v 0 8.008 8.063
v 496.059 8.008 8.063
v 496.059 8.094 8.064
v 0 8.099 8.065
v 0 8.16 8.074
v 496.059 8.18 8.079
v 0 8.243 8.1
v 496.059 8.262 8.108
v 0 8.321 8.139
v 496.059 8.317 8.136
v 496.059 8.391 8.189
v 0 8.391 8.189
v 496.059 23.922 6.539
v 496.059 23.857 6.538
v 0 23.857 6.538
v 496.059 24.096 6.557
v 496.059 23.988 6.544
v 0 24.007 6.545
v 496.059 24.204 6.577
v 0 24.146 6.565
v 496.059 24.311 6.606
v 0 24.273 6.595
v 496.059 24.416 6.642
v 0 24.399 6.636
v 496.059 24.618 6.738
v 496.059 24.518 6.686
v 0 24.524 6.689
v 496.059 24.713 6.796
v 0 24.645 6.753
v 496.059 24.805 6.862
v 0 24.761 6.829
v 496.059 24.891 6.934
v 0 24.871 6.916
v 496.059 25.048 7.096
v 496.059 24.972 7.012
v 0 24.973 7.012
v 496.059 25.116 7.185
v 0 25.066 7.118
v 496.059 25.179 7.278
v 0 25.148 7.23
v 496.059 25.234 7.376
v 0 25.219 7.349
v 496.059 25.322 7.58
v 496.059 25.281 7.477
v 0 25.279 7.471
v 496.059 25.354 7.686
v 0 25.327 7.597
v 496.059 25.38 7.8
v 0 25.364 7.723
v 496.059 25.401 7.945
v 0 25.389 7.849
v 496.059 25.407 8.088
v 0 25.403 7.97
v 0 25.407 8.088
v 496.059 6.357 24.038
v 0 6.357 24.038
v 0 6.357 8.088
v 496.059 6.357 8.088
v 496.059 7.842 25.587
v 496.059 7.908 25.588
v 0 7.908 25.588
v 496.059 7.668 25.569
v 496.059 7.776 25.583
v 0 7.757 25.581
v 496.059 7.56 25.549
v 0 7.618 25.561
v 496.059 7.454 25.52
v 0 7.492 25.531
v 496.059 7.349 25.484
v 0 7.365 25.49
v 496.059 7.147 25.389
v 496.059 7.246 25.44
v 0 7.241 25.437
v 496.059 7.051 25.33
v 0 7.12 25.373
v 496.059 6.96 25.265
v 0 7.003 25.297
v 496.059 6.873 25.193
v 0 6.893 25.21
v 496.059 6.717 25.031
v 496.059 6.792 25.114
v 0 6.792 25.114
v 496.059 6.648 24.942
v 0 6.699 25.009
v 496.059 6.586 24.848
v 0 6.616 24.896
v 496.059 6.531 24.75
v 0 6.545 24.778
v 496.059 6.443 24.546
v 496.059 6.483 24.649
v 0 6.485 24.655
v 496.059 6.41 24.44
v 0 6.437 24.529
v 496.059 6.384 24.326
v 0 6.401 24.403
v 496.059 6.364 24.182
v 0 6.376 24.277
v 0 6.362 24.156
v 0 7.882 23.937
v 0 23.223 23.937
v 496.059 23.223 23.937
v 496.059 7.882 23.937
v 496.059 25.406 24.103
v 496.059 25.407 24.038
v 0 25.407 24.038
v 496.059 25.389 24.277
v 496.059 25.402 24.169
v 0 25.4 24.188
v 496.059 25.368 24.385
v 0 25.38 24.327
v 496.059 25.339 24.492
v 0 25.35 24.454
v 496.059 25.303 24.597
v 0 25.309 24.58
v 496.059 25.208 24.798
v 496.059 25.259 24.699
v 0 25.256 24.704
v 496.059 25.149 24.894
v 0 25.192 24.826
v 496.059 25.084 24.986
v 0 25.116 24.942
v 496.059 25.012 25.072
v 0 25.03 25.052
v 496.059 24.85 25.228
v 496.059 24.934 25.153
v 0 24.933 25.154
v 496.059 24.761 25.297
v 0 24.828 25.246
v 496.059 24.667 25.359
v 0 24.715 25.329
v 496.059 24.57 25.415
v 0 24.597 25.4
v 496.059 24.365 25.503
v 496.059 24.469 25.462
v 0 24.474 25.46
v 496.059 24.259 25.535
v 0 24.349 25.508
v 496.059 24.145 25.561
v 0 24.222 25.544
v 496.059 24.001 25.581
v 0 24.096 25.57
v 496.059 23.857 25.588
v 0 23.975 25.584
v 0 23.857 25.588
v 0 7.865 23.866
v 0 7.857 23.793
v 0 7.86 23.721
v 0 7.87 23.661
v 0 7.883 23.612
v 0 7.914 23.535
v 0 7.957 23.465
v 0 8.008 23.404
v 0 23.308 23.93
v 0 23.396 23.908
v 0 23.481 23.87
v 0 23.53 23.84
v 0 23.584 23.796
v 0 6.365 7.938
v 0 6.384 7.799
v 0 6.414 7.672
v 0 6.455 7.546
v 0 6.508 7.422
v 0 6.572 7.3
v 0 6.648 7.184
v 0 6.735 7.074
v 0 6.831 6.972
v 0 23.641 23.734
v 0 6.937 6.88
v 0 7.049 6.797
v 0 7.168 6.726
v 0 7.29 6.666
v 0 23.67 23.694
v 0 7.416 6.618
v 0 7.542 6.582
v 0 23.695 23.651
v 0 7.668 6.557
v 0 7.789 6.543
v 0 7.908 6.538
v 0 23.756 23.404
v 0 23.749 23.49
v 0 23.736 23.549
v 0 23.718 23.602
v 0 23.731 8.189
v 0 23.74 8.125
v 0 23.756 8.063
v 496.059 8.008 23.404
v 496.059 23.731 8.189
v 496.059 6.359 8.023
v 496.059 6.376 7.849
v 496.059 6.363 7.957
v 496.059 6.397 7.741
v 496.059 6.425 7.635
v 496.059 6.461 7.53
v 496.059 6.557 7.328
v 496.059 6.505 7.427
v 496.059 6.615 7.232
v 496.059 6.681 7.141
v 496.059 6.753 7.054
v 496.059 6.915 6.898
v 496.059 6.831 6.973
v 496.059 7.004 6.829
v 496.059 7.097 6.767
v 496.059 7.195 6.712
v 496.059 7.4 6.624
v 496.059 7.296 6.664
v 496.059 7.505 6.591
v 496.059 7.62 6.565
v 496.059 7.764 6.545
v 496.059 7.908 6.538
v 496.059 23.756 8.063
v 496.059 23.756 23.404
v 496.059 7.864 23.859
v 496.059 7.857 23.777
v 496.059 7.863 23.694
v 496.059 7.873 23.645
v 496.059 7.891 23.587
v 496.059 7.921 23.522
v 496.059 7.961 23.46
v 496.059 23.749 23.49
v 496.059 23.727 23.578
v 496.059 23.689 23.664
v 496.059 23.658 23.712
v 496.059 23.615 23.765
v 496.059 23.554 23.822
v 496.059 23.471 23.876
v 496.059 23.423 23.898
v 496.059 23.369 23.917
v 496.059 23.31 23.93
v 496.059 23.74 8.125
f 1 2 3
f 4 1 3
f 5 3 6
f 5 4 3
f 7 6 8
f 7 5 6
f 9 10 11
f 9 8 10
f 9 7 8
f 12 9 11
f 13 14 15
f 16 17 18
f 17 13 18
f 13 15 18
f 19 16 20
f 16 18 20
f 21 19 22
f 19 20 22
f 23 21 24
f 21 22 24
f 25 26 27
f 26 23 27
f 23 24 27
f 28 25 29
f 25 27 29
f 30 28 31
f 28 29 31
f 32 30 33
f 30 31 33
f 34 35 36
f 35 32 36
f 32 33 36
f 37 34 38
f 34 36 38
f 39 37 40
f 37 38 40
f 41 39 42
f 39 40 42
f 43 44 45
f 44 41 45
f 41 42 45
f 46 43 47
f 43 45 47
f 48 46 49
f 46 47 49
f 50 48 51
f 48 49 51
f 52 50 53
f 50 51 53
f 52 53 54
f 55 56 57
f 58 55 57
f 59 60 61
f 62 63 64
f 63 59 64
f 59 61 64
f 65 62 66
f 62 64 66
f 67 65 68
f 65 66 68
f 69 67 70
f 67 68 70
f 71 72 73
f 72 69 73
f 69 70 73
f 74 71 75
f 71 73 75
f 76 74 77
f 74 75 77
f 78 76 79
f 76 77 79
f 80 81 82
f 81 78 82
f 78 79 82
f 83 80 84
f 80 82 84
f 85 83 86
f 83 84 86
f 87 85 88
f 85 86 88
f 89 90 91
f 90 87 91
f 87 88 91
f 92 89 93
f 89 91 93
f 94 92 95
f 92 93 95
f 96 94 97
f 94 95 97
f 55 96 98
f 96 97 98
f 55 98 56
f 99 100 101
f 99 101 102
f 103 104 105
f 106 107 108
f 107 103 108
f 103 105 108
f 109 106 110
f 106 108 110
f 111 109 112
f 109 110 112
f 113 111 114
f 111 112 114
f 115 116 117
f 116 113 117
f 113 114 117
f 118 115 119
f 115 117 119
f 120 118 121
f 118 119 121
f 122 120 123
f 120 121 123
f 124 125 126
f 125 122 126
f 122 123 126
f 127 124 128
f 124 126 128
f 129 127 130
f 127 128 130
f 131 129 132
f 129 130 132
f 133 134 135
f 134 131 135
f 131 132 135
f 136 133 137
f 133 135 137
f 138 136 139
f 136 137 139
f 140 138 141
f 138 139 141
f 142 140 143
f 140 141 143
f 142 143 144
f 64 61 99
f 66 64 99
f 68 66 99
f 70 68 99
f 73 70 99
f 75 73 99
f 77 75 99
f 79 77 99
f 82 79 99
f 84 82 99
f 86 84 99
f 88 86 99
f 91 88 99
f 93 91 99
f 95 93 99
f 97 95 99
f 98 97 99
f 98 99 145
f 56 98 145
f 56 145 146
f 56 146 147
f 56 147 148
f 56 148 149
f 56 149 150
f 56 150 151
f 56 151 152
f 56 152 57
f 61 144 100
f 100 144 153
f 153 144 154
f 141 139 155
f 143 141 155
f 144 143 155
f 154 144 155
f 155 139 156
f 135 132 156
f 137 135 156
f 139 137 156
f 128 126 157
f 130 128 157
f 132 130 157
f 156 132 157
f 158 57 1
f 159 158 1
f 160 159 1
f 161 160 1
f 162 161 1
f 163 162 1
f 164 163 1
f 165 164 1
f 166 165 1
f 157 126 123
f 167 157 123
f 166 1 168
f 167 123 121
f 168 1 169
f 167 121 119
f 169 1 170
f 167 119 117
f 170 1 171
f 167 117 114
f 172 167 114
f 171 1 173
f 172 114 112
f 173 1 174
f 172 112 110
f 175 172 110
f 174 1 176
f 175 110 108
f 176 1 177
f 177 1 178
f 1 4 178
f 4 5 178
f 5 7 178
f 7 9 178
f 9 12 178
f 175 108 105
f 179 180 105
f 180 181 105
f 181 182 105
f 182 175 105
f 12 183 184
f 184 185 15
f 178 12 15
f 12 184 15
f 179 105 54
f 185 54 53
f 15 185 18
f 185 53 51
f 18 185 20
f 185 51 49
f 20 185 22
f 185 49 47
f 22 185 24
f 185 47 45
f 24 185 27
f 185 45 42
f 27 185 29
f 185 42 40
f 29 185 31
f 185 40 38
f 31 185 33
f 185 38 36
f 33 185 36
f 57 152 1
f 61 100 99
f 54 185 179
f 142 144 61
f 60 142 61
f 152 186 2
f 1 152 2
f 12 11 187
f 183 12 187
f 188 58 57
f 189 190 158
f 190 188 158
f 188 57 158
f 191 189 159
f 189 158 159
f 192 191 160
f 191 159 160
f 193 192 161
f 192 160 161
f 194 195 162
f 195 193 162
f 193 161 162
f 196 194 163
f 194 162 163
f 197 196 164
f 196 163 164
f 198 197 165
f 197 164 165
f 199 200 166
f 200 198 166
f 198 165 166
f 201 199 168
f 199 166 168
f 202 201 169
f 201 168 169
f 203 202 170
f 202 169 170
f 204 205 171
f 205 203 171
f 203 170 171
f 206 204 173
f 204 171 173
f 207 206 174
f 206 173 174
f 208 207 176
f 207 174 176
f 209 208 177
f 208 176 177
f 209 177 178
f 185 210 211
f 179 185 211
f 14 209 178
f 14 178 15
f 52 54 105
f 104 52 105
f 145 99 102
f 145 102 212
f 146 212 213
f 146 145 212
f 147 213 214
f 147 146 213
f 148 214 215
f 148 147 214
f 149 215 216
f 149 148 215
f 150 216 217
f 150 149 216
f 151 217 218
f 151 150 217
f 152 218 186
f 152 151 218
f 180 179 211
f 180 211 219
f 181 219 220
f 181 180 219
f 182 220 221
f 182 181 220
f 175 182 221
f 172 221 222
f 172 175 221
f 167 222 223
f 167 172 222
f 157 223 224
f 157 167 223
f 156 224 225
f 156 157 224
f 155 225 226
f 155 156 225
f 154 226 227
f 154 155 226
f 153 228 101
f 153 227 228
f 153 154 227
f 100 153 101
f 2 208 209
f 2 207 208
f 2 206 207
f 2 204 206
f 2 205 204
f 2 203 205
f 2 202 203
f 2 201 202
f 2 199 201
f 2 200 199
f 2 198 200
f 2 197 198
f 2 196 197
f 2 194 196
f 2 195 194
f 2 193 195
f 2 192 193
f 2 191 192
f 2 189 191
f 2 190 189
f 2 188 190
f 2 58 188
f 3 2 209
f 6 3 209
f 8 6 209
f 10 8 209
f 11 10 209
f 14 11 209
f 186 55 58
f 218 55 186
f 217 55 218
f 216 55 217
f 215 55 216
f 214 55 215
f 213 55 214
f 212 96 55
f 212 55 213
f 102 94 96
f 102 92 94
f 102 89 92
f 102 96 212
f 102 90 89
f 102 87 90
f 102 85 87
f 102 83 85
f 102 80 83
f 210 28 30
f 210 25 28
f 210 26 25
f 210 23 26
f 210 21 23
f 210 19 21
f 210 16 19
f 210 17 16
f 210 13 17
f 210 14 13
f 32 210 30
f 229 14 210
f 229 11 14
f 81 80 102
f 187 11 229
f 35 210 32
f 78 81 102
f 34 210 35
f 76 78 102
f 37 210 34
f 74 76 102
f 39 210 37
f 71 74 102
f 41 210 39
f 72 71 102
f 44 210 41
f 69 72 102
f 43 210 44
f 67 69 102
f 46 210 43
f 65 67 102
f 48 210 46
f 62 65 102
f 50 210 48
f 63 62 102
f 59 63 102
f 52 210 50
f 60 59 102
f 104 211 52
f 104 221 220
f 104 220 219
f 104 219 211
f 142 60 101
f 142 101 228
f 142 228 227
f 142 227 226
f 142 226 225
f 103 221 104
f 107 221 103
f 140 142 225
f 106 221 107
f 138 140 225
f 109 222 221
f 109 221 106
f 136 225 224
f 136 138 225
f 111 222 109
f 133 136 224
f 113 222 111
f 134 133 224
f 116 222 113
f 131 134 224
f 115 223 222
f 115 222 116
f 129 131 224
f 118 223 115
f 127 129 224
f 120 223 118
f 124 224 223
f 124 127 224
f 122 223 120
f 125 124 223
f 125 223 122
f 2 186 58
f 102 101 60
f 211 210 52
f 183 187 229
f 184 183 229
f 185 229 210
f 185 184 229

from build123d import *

# Parameters (mm, degrees)
BOSS_EXTRUDE1_DEPTH = 609.6
SCALE1_SCALE_X      = 1
SCALE1_SCALE_Y      = 0.6
SCALE1_SCALE_Z      = 0.6
SKETCH3_W           = 113.540531561
SKETCH3_H           = 19.05
CUT_EXTRUDE2_DEPTH  = 611.426562419


with BuildPart() as part:
    # Sketch1 → Boss-Extrude1 (new body)
    with BuildSketch(Plane(origin=(0, 0, 0), x_dir=(0, 0, -1), z_dir=(1, 0, 0))):
        with BuildLine():
            Line((-0.186356914, 2.58389064), (-0.186356914, 29.16610936))
            ThreePointArc((-0.186356914, 29.16610936), (-0.94316096, 30.993195953), (-2.770247554, 31.75))
            Line((-2.770247554, 31.75), (-29.352466273, 31.75))
            ThreePointArc((-29.352466273, 31.75), (-31.179552867, 30.993195953), (-31.936356914, 29.16610936))
            Line((-31.936356914, 29.16610936), (-31.936356914, 2.58389064))
            ThreePointArc((-31.936356914, 2.58389064), (-31.179552867, 0.756804047), (-29.352466273, 0))
            Line((-29.352466273, 0), (-2.770247554, 0))
            ThreePointArc((-2.770247554, 0), (-0.94316096, 0.756804047), (-0.186356914, 2.58389064))
        make_face()
        with BuildLine():
            Line((-2.93802358, 3.388849212), (-2.93802358, 28.956637898))
            ThreePointArc((-2.93802358, 28.956637898), (-2.83170208, 28.97113344), (-2.727901561, 28.998333333))
            Line((-2.727901561, 28.998333333), (-28.295690247, 28.998333333))
            ThreePointArc((-28.295690247, 28.998333333), (-28.924308175, 28.737951262), (-29.184690247, 28.109333333))
            Line((-29.184690247, 28.109333333), (-29.184690247, 2.541544647))
            ThreePointArc((-29.184690247, 2.541544647), (-28.71113746, 2.523686947), (-28.295690247, 2.751666667))
            Line((-28.295690247, 2.751666667), (-2.727901561, 2.751666667))
            ThreePointArc((-2.727901561, 2.751666667), (-2.770544519, 3.090841377), (-2.93802358, 3.388849212))
        make_face(mode=Mode.SUBTRACT)
    extrude(amount=BOSS_EXTRUDE1_DEPTH)


with BuildPart() as part_1:
    # Scale1: scaled about (304.8, 15.89298345, 16.065667914)
    add(part.part.scale((SCALE1_SCALE_X, SCALE1_SCALE_Y, SCALE1_SCALE_Z), about=(304.8, 15.89298345, 16.065667914)))

    # Sketch3 → Cut-Extrude2 (cut, through all)
    with BuildSketch(Plane.XY.offset(25.588081314)):
        with Locations((552.82973422, 15.88219338)):
            Rectangle(SKETCH3_W, SKETCH3_H)
    extrude(amount=-CUT_EXTRUDE2_DEPTH, mode=Mode.SUBTRACT)


solid = part_1.part
